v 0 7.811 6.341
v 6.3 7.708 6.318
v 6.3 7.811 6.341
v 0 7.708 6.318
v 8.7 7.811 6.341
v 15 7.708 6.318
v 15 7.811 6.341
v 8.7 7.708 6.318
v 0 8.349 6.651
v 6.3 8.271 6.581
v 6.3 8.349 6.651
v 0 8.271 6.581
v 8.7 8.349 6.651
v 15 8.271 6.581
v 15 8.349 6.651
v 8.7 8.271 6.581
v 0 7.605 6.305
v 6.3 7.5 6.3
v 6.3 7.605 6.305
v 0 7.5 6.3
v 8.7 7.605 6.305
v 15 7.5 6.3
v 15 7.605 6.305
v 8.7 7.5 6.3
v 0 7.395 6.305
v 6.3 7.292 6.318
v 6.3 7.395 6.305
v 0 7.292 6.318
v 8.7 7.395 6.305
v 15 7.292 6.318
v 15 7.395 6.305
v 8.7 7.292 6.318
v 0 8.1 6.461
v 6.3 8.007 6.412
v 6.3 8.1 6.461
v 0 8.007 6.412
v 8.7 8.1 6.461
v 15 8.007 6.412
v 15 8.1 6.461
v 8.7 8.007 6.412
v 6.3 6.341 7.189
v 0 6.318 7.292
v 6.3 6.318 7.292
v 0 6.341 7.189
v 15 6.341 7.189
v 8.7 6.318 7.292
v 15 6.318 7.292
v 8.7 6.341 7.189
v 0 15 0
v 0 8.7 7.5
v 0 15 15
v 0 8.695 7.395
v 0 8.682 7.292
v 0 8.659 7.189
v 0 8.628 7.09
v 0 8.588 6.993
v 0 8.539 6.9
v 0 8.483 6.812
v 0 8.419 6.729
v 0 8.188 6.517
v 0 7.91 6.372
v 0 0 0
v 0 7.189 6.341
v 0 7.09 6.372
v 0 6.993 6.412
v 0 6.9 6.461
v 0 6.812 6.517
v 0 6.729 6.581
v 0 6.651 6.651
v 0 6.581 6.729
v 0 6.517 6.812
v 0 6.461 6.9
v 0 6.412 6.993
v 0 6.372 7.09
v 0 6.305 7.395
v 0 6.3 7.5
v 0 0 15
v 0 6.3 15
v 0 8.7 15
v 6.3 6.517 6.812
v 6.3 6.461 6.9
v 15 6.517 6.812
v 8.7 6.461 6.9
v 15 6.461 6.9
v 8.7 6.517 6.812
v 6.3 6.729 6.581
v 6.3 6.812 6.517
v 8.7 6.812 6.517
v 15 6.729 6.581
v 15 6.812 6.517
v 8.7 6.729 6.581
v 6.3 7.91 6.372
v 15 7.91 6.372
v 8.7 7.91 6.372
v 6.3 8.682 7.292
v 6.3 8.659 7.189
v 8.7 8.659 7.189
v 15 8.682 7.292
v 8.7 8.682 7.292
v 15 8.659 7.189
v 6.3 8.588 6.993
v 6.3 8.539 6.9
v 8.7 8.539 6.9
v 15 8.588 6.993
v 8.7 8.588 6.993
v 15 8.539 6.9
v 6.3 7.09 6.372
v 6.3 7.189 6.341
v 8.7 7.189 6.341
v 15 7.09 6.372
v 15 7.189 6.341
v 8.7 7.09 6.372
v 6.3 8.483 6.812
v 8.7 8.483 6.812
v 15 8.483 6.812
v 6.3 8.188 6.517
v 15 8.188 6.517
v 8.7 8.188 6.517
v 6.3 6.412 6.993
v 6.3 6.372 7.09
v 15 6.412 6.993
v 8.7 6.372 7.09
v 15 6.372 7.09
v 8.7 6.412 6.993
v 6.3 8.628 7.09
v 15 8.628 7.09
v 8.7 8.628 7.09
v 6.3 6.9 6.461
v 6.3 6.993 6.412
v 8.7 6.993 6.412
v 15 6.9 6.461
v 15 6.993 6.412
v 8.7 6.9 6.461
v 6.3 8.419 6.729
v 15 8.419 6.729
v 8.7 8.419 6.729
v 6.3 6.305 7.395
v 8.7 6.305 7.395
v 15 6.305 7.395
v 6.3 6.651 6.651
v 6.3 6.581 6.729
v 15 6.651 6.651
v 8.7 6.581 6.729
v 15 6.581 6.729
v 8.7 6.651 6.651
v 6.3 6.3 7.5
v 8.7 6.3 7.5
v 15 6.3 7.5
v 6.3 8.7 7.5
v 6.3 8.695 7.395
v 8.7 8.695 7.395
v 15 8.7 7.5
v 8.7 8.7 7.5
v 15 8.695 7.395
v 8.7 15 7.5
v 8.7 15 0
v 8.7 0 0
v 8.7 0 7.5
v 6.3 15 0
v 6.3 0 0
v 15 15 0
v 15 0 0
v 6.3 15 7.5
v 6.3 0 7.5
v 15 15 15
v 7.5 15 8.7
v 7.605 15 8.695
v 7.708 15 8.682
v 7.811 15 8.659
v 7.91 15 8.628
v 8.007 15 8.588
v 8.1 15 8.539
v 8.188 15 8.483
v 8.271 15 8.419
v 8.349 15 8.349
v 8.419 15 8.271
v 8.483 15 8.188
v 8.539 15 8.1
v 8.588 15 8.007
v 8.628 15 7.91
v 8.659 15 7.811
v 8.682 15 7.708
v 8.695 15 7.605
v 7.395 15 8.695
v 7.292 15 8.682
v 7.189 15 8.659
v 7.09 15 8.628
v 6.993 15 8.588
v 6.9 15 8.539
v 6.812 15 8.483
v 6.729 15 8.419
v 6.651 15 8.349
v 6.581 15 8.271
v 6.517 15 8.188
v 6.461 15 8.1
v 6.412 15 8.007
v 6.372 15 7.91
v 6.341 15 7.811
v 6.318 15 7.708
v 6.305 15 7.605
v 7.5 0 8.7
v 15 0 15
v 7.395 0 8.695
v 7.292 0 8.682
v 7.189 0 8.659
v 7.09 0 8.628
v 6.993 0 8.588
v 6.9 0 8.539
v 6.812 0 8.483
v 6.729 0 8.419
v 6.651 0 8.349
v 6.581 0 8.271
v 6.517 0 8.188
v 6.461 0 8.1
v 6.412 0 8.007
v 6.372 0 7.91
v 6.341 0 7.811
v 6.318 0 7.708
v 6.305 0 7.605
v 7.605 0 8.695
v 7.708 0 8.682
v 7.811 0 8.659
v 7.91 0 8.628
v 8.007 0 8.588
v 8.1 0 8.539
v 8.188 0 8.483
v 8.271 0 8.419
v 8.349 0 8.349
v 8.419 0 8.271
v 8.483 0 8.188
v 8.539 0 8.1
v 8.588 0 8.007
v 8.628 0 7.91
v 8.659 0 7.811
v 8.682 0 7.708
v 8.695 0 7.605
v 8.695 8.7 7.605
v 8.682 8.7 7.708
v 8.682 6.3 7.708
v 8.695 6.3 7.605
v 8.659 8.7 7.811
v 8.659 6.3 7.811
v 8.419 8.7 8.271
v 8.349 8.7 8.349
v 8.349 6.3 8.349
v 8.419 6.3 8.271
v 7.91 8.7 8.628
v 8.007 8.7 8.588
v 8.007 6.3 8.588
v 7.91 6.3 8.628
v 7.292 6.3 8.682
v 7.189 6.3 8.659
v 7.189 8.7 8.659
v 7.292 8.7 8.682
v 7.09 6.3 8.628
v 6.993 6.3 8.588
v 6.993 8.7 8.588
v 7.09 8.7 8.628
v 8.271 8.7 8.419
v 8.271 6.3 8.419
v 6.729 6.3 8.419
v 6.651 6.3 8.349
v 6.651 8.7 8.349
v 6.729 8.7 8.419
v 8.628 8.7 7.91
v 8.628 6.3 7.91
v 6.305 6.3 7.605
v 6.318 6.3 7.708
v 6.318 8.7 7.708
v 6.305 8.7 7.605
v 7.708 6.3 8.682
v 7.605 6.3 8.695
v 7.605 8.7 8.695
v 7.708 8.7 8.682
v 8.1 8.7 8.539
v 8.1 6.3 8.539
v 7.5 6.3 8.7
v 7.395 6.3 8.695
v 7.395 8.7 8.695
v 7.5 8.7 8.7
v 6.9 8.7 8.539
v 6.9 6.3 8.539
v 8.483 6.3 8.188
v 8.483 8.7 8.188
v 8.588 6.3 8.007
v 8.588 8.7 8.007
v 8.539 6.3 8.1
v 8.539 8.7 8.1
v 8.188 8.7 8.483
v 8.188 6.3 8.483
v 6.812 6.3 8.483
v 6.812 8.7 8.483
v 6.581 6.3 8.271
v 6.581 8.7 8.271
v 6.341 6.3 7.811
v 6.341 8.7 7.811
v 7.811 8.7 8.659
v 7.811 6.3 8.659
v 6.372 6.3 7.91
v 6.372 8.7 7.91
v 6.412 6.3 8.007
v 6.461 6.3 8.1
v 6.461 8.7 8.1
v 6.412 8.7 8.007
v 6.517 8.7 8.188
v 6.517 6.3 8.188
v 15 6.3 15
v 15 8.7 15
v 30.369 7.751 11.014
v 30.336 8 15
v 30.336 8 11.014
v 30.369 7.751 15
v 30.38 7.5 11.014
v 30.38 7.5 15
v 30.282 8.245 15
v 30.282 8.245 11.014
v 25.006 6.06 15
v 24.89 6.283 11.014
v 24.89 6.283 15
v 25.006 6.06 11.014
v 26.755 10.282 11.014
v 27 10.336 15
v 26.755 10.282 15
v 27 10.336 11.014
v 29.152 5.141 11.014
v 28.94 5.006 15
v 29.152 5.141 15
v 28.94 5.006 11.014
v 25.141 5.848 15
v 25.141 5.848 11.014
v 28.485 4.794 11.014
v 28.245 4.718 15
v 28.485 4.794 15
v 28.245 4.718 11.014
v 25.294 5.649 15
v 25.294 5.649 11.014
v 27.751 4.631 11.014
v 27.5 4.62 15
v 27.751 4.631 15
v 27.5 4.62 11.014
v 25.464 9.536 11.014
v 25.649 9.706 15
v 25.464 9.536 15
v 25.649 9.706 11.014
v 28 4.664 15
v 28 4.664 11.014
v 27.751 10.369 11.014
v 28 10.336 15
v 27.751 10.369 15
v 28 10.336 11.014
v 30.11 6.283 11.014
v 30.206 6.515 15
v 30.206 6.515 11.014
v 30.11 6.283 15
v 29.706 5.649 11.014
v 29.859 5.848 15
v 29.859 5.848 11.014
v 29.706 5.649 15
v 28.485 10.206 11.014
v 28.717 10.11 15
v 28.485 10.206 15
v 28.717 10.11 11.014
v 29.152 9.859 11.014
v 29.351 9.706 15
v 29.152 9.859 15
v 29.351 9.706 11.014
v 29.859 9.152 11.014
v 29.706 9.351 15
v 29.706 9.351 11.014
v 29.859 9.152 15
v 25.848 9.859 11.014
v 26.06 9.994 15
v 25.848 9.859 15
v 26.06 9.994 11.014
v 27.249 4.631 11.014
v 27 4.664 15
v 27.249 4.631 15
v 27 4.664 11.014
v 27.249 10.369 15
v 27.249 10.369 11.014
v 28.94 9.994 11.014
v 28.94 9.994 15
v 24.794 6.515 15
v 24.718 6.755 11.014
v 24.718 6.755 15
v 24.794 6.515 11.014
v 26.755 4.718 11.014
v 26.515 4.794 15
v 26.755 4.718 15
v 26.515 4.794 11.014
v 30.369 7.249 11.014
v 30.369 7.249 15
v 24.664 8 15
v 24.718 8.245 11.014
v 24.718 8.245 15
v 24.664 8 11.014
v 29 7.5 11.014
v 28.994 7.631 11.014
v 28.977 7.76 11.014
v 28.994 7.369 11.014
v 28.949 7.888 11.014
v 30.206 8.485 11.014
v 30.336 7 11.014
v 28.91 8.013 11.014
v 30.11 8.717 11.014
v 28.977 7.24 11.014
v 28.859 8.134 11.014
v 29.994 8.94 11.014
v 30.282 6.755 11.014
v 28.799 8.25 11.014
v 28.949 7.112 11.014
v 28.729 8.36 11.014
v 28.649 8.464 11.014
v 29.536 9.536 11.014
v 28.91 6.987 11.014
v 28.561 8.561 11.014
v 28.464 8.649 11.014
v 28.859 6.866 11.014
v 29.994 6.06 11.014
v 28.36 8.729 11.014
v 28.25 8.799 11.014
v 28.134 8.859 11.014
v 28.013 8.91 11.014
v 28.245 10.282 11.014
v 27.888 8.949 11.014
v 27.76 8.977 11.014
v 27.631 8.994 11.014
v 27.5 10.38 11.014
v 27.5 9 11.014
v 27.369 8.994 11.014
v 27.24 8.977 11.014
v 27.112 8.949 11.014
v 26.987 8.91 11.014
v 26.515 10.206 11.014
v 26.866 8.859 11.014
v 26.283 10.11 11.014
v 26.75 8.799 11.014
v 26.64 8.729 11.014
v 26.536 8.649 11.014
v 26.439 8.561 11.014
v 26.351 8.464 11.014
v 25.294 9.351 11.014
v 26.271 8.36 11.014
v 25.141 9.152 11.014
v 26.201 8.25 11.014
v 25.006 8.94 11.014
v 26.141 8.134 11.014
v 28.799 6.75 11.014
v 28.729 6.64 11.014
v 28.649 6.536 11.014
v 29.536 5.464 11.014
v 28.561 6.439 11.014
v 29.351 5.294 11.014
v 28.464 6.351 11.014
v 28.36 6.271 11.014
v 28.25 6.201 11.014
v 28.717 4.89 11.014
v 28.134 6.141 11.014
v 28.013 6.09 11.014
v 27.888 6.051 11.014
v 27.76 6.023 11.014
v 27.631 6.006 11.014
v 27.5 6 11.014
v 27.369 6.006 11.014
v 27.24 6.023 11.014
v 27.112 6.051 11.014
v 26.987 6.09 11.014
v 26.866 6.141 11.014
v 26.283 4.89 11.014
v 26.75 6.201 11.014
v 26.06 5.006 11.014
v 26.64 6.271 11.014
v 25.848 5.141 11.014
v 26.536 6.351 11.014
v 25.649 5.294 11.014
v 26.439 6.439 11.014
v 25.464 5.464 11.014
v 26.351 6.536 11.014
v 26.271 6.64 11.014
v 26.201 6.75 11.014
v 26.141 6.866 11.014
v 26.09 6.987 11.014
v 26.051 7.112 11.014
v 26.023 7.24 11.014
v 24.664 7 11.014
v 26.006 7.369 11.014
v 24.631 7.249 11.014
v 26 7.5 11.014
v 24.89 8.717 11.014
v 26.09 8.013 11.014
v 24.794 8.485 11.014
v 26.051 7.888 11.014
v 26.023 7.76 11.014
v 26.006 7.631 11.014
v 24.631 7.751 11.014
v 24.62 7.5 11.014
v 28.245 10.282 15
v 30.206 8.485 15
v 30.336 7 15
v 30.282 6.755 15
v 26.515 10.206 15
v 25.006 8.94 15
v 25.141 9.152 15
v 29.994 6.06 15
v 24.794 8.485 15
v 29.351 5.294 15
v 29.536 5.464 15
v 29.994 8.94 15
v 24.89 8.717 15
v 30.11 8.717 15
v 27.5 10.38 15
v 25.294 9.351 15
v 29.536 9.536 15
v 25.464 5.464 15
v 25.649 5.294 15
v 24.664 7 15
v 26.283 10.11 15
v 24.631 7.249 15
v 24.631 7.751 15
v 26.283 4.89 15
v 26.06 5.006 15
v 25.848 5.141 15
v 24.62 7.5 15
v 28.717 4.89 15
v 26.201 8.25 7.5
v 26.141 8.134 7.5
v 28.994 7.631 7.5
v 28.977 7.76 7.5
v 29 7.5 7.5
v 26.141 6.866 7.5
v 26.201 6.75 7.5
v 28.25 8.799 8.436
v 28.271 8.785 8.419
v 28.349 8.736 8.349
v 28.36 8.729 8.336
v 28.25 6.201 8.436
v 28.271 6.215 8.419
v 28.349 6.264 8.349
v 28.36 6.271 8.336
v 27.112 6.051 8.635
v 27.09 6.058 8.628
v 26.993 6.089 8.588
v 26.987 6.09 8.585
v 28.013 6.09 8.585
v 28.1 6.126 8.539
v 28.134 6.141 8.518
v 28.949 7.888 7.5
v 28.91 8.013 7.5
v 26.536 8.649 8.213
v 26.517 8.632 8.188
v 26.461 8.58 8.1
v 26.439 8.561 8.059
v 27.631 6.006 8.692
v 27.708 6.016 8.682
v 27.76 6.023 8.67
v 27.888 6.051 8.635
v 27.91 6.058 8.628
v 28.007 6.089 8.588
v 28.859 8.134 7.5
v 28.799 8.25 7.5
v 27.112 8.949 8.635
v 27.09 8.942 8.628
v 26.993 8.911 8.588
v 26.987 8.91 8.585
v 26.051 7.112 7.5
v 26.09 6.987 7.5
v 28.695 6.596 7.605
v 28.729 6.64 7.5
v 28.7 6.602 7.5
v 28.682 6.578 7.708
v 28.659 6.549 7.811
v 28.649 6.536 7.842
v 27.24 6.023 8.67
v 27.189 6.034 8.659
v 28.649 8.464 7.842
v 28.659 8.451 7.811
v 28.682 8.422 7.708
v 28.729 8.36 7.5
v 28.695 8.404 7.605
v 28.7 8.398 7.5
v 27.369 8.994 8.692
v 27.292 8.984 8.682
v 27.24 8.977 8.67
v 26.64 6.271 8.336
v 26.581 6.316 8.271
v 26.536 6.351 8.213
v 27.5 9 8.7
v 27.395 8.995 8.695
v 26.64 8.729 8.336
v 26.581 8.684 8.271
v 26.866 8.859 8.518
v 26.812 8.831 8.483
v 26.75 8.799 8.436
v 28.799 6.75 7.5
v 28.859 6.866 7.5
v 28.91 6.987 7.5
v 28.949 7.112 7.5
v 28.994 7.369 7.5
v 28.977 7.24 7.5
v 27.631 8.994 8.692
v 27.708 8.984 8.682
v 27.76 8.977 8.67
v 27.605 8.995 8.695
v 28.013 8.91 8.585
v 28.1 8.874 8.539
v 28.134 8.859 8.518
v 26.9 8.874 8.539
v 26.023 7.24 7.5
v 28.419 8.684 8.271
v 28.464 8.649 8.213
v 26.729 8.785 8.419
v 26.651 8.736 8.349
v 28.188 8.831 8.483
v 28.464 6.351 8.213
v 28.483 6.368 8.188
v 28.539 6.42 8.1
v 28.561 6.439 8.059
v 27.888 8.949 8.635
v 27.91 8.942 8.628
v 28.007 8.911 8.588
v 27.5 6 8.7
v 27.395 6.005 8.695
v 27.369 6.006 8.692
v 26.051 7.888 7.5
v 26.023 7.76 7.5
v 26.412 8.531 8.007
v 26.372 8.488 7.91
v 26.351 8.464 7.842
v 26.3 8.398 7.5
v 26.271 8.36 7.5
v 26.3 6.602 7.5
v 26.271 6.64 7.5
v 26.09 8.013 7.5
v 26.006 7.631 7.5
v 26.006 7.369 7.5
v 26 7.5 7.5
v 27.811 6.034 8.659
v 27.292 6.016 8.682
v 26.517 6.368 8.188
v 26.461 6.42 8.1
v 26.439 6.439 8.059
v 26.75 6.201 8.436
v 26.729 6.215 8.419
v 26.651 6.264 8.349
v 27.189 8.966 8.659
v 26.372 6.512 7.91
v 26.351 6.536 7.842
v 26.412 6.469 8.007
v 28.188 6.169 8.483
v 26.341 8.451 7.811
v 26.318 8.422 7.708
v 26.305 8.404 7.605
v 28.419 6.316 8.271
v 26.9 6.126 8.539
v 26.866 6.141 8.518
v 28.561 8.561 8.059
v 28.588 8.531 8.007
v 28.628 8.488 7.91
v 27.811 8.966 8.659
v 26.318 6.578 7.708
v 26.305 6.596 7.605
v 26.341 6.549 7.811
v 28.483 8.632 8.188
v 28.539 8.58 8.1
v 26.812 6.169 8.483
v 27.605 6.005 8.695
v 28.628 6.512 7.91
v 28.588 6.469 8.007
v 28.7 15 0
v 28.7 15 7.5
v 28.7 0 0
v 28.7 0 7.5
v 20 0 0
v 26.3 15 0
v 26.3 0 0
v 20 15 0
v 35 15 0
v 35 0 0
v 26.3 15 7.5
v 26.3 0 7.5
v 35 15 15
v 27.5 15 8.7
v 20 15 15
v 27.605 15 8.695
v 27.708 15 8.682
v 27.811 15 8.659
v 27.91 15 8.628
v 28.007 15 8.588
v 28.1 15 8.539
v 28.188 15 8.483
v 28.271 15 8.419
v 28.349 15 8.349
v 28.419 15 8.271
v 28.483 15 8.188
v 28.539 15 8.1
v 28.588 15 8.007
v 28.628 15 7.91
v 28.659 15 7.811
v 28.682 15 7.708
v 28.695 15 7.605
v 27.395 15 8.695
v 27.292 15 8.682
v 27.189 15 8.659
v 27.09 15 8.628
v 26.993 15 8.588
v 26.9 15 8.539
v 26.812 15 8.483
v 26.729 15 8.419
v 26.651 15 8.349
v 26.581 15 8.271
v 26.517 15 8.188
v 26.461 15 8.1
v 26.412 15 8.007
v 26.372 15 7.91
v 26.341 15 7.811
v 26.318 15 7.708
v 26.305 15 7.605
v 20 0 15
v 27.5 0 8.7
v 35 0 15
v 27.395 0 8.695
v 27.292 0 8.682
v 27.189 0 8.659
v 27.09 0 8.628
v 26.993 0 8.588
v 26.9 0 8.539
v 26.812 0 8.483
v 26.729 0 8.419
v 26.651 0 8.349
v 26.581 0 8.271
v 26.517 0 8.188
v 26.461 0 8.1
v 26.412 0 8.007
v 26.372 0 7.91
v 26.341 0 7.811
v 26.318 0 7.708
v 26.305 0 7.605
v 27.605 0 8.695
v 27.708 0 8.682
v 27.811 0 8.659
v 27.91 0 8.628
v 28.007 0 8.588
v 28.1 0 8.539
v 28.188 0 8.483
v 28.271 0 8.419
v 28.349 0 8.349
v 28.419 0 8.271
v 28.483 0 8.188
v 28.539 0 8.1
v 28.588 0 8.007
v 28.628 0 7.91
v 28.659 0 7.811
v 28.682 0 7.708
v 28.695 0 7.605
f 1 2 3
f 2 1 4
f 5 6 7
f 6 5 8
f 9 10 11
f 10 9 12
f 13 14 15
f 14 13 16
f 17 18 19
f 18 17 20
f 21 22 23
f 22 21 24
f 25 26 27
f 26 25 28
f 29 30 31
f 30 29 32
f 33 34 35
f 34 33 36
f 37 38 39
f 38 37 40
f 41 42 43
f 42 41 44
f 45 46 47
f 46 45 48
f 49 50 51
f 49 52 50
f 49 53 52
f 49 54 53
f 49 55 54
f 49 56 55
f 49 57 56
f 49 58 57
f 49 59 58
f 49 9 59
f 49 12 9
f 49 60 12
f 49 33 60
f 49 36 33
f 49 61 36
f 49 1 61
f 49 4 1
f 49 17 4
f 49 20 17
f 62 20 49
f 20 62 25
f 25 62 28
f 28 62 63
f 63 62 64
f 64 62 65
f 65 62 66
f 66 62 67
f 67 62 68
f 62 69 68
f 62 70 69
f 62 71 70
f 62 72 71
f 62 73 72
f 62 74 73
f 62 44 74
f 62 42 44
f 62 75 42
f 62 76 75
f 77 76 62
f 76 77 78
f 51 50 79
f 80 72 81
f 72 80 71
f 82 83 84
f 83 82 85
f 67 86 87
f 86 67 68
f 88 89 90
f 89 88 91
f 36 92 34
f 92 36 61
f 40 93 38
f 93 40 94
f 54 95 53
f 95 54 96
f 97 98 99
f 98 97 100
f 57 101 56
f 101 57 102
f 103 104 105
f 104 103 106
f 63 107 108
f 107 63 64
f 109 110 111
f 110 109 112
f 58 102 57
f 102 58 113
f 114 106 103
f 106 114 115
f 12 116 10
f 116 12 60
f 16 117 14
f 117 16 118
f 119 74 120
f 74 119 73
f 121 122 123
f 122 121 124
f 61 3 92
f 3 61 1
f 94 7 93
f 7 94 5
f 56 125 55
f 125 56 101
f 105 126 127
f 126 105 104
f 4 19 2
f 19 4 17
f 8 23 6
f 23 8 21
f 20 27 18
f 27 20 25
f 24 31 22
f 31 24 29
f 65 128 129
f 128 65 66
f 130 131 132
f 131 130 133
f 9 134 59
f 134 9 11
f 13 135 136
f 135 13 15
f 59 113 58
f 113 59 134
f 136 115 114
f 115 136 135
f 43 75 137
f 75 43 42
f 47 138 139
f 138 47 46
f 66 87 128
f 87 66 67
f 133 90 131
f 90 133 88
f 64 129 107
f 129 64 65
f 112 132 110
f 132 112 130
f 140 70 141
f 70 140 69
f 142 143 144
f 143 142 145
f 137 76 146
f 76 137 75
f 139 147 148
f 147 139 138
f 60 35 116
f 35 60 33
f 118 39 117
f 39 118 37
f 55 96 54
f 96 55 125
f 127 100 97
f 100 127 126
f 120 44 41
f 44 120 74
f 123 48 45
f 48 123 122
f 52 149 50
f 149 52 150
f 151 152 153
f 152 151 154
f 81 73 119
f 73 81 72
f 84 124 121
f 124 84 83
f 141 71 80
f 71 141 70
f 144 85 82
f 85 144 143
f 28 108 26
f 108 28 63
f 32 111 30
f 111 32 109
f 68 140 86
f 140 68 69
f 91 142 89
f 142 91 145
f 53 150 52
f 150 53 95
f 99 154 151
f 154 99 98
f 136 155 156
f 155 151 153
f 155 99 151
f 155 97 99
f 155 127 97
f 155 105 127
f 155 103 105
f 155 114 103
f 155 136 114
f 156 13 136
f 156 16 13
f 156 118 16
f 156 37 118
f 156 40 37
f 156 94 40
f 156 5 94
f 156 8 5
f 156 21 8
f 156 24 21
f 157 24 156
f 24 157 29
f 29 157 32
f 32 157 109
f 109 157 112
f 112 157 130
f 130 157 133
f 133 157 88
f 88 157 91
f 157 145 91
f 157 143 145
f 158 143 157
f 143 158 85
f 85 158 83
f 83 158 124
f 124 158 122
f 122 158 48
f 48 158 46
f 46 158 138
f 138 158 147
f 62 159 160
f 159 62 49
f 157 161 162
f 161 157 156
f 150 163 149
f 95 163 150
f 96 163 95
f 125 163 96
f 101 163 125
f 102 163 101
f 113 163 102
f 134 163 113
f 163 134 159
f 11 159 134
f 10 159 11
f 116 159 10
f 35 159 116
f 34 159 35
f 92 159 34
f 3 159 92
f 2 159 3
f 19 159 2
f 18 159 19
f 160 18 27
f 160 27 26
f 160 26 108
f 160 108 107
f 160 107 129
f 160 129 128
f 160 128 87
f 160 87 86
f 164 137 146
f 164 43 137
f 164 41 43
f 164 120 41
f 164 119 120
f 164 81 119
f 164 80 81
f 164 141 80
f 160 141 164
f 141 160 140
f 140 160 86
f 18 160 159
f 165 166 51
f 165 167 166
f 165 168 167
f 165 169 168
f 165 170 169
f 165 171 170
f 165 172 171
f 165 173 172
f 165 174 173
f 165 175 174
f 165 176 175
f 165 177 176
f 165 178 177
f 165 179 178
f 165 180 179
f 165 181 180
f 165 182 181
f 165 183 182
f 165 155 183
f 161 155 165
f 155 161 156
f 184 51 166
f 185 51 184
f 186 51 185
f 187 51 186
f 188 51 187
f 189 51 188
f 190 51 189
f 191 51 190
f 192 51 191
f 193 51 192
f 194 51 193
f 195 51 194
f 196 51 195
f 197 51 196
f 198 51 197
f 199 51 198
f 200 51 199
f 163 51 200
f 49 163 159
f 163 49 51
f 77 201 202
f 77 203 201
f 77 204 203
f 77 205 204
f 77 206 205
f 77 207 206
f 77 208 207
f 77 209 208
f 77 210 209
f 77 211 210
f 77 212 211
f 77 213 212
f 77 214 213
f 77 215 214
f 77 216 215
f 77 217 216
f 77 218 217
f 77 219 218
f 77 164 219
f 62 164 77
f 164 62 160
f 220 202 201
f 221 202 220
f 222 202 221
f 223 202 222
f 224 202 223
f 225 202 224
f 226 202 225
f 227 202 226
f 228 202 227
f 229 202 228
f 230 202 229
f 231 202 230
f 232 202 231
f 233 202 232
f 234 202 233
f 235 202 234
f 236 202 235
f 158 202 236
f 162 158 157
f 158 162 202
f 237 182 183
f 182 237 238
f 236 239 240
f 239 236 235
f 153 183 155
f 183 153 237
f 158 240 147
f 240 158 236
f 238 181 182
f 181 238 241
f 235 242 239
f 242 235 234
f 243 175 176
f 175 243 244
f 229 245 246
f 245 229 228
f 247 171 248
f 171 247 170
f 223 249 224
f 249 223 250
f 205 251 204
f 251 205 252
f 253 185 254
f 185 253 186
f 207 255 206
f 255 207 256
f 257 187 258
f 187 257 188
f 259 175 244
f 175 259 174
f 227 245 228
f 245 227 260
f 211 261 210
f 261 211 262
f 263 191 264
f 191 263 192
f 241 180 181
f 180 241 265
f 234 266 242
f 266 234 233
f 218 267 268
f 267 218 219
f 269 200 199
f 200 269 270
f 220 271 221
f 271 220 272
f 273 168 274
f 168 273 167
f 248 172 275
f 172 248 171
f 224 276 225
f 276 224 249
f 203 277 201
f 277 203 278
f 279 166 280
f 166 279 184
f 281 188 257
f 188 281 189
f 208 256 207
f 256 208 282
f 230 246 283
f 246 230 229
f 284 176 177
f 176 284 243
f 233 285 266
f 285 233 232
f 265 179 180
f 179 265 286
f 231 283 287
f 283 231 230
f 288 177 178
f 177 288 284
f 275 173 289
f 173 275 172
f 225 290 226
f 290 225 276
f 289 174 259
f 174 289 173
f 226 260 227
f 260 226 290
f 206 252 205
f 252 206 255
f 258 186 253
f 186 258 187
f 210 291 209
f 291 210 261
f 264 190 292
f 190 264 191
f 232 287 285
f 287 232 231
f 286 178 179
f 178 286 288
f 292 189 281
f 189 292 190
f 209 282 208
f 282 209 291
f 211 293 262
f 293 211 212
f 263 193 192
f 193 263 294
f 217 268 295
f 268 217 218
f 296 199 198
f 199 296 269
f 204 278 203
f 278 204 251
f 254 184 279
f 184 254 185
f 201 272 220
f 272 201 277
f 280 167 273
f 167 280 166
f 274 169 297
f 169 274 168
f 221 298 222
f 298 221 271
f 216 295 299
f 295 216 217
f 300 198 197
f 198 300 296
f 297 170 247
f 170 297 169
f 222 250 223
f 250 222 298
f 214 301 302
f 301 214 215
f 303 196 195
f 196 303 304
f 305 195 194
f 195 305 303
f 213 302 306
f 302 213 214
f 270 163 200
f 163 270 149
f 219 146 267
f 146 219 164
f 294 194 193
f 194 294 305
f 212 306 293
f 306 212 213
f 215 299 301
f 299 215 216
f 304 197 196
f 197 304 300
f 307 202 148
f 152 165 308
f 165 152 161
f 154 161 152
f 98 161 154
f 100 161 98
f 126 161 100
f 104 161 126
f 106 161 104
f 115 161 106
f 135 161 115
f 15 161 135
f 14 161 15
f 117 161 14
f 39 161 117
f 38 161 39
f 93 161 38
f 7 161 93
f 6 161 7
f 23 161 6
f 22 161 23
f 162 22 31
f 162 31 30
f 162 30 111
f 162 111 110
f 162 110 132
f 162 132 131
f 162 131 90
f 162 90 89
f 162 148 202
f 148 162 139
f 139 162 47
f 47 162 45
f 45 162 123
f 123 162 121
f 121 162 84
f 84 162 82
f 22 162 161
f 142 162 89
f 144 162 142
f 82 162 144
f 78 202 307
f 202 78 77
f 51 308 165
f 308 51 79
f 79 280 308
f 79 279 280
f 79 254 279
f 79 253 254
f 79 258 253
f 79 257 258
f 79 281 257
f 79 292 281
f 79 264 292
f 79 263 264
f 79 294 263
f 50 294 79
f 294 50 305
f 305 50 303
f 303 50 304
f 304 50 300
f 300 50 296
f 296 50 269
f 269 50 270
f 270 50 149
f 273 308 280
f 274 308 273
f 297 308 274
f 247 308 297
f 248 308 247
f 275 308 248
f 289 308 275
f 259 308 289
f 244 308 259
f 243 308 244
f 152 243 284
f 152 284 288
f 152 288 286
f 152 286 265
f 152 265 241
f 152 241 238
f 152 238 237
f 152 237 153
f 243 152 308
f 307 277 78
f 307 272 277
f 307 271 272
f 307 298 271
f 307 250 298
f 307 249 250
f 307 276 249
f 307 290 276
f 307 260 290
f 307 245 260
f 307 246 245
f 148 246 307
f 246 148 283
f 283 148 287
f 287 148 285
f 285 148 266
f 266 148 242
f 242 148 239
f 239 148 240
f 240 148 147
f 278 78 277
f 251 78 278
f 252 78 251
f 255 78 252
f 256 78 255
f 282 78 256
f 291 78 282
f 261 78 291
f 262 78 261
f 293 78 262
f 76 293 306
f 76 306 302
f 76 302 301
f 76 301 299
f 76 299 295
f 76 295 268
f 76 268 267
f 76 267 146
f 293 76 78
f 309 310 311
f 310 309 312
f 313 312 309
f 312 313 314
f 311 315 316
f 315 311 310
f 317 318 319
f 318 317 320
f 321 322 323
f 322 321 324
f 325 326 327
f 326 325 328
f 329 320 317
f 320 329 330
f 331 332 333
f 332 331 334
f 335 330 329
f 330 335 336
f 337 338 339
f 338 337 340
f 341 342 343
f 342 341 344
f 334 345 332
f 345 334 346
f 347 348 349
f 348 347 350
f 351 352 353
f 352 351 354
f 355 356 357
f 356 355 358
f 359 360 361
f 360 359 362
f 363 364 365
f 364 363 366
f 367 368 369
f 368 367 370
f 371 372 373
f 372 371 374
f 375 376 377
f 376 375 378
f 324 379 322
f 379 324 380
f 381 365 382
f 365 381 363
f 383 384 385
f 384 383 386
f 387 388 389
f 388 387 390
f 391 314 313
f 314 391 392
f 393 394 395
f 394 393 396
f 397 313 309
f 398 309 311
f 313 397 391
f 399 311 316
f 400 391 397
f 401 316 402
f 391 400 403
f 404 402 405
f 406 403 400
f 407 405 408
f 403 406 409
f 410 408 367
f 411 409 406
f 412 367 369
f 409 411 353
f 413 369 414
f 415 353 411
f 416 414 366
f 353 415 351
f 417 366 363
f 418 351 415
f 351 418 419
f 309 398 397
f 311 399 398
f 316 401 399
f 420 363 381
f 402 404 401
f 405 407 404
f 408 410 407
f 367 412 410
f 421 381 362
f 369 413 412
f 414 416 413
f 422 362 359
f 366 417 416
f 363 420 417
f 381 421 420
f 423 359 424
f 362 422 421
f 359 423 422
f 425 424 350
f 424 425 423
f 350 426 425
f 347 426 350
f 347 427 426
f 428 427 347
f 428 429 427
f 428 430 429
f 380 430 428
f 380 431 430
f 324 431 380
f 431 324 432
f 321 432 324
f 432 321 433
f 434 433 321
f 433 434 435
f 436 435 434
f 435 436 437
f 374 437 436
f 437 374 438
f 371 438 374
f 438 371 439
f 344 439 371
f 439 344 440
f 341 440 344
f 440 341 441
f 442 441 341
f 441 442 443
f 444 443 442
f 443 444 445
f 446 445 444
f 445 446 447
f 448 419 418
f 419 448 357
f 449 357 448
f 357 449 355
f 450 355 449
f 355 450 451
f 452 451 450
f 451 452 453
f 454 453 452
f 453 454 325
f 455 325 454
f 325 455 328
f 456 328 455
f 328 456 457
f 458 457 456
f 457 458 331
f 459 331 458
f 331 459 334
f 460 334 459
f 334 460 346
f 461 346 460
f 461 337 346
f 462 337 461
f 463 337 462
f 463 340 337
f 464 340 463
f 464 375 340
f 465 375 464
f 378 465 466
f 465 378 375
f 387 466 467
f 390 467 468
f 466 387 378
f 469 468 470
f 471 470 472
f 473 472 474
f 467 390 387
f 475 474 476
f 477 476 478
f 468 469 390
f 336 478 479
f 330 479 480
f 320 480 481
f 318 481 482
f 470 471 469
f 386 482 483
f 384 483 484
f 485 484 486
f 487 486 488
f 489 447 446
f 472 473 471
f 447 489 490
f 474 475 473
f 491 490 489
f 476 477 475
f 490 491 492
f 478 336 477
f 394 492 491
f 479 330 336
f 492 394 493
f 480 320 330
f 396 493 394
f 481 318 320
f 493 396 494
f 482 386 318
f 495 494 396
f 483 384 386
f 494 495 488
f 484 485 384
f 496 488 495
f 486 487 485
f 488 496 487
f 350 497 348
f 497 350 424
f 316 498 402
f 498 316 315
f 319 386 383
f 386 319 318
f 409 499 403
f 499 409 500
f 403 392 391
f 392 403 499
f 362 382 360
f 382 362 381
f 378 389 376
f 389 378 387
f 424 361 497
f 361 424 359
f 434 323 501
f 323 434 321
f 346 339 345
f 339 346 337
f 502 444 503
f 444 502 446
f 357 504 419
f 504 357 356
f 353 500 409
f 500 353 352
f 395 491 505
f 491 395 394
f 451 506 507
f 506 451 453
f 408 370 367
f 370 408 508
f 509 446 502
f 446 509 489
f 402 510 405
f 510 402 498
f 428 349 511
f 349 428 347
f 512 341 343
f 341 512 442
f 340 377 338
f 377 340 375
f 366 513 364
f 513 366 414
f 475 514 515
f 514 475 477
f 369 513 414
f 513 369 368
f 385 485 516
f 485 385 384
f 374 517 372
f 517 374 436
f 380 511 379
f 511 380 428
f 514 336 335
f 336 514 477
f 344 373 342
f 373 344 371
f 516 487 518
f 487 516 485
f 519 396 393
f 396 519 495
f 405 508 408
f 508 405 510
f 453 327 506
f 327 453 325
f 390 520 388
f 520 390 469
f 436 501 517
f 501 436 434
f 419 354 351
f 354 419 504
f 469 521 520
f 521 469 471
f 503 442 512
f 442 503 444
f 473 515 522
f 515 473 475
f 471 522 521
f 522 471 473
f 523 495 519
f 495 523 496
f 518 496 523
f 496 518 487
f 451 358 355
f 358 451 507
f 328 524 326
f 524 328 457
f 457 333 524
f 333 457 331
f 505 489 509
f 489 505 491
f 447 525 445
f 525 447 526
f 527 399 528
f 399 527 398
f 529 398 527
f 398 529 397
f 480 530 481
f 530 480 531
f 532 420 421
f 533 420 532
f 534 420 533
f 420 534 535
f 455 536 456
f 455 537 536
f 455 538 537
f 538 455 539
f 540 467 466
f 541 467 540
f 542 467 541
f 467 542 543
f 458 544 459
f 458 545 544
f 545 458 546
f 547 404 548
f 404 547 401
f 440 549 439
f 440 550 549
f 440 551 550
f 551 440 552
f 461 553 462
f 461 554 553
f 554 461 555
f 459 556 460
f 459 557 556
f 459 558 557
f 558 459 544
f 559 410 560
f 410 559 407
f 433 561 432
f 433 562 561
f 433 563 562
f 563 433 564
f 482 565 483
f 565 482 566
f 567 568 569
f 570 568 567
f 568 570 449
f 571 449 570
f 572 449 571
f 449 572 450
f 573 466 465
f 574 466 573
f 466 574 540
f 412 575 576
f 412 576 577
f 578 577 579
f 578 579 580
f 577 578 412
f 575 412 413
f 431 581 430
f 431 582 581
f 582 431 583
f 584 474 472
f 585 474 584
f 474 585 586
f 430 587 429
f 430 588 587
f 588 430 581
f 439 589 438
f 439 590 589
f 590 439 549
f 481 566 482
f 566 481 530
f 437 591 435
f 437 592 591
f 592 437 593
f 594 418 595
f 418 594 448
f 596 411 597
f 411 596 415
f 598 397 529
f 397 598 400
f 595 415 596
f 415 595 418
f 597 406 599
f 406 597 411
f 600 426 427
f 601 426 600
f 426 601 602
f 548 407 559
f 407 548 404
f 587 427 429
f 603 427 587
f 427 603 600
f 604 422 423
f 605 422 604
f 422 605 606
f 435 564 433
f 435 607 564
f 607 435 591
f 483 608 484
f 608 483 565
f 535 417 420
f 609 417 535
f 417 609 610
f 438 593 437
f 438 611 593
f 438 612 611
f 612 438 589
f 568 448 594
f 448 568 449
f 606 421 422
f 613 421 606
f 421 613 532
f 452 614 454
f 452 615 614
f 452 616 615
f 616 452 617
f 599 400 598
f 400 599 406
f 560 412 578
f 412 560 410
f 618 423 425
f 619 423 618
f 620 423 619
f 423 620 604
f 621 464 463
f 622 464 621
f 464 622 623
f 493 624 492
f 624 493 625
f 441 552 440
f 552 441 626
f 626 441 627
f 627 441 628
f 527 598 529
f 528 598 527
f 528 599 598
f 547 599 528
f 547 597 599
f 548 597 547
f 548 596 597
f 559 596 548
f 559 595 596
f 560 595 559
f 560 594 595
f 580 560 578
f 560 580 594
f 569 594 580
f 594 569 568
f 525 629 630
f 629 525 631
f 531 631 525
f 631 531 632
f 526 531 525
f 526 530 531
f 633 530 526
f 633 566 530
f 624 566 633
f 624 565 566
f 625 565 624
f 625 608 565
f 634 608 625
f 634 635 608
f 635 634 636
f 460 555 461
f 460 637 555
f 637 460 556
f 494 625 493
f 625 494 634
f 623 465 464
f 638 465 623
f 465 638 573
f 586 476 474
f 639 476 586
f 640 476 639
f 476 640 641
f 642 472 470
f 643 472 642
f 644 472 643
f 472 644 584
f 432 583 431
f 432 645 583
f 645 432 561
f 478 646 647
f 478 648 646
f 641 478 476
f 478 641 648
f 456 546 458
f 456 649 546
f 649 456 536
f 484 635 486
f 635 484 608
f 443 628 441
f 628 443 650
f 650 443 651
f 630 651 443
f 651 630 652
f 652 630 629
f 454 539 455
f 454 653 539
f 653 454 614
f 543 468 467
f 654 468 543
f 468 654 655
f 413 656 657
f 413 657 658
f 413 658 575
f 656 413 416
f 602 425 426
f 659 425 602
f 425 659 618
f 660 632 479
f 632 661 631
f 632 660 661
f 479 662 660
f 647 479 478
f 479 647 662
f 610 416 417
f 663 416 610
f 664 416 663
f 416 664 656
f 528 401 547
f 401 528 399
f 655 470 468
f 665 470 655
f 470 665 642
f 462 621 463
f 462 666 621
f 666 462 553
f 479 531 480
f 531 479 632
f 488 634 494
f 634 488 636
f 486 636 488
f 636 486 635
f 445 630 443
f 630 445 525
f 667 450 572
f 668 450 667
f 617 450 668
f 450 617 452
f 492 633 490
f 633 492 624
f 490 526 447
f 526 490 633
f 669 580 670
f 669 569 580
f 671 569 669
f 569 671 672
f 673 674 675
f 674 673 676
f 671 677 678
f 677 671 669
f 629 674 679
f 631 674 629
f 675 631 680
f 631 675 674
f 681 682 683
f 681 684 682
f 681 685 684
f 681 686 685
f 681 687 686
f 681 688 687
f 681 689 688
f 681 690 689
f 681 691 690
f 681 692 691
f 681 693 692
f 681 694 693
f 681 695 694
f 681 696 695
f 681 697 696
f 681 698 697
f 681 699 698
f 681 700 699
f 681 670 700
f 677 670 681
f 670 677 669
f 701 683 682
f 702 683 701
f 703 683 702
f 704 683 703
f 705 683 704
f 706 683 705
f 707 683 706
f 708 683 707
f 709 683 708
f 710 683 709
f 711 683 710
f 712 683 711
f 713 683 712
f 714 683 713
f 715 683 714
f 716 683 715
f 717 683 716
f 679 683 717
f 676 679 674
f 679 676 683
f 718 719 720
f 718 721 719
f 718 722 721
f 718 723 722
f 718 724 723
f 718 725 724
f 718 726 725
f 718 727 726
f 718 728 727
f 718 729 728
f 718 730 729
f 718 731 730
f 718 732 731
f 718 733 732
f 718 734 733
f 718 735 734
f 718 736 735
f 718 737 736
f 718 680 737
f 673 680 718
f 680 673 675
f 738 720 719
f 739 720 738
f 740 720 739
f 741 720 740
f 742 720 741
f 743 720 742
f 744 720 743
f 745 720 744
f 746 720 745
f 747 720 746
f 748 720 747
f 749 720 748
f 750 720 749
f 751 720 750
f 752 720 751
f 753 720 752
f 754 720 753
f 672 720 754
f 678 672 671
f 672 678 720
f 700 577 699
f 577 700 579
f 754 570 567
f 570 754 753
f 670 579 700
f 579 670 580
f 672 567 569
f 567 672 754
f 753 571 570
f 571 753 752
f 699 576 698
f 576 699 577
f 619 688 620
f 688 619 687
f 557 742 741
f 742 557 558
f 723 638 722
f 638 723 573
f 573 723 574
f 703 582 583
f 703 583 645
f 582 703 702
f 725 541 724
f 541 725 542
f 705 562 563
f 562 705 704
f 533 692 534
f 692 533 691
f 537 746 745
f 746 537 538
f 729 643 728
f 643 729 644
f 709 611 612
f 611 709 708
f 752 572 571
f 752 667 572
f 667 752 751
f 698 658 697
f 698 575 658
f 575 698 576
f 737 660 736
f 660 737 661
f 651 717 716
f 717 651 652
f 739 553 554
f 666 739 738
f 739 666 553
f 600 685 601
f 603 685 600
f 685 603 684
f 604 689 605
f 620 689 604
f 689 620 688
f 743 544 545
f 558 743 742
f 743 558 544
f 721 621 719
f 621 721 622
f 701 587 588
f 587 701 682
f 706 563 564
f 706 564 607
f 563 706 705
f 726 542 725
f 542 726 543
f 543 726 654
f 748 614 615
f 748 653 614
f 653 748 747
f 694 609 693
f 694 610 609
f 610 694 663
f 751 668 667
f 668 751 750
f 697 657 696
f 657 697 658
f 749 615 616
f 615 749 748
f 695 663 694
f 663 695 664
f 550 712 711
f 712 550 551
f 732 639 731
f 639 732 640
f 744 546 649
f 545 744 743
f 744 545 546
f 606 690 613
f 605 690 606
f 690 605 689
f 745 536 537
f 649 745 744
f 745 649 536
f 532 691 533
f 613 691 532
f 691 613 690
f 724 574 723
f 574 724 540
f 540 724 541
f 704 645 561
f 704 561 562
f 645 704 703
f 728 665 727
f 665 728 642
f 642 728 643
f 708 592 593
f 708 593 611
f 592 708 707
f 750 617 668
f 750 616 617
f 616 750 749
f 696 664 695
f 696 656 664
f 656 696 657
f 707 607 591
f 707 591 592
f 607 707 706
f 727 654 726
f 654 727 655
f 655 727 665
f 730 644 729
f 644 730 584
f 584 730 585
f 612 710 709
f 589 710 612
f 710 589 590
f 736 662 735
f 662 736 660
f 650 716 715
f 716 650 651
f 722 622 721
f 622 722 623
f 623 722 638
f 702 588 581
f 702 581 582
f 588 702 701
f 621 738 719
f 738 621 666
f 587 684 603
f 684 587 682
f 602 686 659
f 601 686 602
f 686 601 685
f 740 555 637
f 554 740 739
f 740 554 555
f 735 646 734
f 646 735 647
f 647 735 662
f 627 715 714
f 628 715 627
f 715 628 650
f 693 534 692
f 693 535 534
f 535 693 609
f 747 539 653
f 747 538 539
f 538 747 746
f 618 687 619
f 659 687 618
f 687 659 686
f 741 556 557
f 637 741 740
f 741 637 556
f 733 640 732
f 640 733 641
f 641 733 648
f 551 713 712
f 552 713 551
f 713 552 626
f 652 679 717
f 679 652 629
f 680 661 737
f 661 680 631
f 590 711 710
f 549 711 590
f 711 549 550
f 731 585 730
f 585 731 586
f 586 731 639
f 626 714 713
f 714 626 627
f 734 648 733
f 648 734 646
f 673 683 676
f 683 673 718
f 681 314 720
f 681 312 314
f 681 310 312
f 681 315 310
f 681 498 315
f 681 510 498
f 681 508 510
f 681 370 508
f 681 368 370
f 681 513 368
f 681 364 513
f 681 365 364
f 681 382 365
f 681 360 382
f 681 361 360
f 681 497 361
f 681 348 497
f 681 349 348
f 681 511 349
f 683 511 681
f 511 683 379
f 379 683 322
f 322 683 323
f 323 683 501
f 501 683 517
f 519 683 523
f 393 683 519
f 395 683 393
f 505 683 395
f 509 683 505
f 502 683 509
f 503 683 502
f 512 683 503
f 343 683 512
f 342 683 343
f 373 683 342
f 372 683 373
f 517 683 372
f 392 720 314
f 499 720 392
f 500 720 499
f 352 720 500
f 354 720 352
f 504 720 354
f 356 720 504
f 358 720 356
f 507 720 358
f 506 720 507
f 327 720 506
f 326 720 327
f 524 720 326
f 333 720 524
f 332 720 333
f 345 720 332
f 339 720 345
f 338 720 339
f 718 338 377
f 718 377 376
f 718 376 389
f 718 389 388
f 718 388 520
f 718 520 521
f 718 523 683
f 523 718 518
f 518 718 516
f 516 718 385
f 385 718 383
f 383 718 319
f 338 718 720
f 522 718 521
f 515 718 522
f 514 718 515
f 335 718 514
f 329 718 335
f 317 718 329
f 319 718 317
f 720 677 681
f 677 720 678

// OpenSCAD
//These are the midle cubes of the snake, print as many as you like of these


// Show me an end or middle cube (or Both)
show_cubes = "Both"; // [Middle,End,Both]

// How big should the cube  be?
cube = 15; // [10:30]


// How big should the hole be? (I'm using 2mm cord, so have set the hole to 2.4mm)
elastichole = 2.4; 


$fn = 72;



module base() {
    hull(){
        translate([0,0,0])
        cube([cube,cube,cube],center = false);    
    }   
}


module holes_Middle() {
    rotate([0,90,0])
    translate([-cube/2,cube/2,0])
    cylinder(h = cube+1, d = elastichole, center = false);

    translate([cube/2-elastichole/2,0,0])
    cube([elastichole,cube,cube/2],center = false);    

    rotate([90,0,0])
    translate([cube/2,cube/2,-cube])
    cylinder(h = cube, d = elastichole, center = false);

    translate([0,cube/2-elastichole/2,cube/2])
    cube([cube,elastichole,cube/2],center = false);    
}




module holes_end() {

//Top hole for the knot (I've made it 2.4 times bigger than the cord hole    
    translate([cube/2,cube/2,cube-cube/3.5+0.3])
    cylinder(h = cube/3.5, d = elastichole*2.4, center = false);

//I've made the hole for the cord 0.6 bigger so the cord goes through easily
    translate([cube/2,cube/2,7.5])
    cylinder(h = cube, d = elastichole+.6, center = false);


    translate([cube/2-elastichole/2,0,0])
    cube([elastichole,cube,cube/2],center = false);    



    rotate([90,0,0])
    translate([cube/2,cube/2,-cube])
    cylinder(h = cube, d = elastichole, center = false);

}


module Middlecube() {
difference(){
    base();
    holes_Middle();
}
}

module Endcube() {
difference(){
    base();
    holes_end();
}
}


if (show_cubes == "Both") {

Middlecube();

translate([cube+5,0,0])
Endcube();
    
}

if (show_cubes == "Middle") {

Middlecube();


    
}

if (show_cubes == "End") {


Endcube();
    
} 

// preview[view:south, tilt:top]
